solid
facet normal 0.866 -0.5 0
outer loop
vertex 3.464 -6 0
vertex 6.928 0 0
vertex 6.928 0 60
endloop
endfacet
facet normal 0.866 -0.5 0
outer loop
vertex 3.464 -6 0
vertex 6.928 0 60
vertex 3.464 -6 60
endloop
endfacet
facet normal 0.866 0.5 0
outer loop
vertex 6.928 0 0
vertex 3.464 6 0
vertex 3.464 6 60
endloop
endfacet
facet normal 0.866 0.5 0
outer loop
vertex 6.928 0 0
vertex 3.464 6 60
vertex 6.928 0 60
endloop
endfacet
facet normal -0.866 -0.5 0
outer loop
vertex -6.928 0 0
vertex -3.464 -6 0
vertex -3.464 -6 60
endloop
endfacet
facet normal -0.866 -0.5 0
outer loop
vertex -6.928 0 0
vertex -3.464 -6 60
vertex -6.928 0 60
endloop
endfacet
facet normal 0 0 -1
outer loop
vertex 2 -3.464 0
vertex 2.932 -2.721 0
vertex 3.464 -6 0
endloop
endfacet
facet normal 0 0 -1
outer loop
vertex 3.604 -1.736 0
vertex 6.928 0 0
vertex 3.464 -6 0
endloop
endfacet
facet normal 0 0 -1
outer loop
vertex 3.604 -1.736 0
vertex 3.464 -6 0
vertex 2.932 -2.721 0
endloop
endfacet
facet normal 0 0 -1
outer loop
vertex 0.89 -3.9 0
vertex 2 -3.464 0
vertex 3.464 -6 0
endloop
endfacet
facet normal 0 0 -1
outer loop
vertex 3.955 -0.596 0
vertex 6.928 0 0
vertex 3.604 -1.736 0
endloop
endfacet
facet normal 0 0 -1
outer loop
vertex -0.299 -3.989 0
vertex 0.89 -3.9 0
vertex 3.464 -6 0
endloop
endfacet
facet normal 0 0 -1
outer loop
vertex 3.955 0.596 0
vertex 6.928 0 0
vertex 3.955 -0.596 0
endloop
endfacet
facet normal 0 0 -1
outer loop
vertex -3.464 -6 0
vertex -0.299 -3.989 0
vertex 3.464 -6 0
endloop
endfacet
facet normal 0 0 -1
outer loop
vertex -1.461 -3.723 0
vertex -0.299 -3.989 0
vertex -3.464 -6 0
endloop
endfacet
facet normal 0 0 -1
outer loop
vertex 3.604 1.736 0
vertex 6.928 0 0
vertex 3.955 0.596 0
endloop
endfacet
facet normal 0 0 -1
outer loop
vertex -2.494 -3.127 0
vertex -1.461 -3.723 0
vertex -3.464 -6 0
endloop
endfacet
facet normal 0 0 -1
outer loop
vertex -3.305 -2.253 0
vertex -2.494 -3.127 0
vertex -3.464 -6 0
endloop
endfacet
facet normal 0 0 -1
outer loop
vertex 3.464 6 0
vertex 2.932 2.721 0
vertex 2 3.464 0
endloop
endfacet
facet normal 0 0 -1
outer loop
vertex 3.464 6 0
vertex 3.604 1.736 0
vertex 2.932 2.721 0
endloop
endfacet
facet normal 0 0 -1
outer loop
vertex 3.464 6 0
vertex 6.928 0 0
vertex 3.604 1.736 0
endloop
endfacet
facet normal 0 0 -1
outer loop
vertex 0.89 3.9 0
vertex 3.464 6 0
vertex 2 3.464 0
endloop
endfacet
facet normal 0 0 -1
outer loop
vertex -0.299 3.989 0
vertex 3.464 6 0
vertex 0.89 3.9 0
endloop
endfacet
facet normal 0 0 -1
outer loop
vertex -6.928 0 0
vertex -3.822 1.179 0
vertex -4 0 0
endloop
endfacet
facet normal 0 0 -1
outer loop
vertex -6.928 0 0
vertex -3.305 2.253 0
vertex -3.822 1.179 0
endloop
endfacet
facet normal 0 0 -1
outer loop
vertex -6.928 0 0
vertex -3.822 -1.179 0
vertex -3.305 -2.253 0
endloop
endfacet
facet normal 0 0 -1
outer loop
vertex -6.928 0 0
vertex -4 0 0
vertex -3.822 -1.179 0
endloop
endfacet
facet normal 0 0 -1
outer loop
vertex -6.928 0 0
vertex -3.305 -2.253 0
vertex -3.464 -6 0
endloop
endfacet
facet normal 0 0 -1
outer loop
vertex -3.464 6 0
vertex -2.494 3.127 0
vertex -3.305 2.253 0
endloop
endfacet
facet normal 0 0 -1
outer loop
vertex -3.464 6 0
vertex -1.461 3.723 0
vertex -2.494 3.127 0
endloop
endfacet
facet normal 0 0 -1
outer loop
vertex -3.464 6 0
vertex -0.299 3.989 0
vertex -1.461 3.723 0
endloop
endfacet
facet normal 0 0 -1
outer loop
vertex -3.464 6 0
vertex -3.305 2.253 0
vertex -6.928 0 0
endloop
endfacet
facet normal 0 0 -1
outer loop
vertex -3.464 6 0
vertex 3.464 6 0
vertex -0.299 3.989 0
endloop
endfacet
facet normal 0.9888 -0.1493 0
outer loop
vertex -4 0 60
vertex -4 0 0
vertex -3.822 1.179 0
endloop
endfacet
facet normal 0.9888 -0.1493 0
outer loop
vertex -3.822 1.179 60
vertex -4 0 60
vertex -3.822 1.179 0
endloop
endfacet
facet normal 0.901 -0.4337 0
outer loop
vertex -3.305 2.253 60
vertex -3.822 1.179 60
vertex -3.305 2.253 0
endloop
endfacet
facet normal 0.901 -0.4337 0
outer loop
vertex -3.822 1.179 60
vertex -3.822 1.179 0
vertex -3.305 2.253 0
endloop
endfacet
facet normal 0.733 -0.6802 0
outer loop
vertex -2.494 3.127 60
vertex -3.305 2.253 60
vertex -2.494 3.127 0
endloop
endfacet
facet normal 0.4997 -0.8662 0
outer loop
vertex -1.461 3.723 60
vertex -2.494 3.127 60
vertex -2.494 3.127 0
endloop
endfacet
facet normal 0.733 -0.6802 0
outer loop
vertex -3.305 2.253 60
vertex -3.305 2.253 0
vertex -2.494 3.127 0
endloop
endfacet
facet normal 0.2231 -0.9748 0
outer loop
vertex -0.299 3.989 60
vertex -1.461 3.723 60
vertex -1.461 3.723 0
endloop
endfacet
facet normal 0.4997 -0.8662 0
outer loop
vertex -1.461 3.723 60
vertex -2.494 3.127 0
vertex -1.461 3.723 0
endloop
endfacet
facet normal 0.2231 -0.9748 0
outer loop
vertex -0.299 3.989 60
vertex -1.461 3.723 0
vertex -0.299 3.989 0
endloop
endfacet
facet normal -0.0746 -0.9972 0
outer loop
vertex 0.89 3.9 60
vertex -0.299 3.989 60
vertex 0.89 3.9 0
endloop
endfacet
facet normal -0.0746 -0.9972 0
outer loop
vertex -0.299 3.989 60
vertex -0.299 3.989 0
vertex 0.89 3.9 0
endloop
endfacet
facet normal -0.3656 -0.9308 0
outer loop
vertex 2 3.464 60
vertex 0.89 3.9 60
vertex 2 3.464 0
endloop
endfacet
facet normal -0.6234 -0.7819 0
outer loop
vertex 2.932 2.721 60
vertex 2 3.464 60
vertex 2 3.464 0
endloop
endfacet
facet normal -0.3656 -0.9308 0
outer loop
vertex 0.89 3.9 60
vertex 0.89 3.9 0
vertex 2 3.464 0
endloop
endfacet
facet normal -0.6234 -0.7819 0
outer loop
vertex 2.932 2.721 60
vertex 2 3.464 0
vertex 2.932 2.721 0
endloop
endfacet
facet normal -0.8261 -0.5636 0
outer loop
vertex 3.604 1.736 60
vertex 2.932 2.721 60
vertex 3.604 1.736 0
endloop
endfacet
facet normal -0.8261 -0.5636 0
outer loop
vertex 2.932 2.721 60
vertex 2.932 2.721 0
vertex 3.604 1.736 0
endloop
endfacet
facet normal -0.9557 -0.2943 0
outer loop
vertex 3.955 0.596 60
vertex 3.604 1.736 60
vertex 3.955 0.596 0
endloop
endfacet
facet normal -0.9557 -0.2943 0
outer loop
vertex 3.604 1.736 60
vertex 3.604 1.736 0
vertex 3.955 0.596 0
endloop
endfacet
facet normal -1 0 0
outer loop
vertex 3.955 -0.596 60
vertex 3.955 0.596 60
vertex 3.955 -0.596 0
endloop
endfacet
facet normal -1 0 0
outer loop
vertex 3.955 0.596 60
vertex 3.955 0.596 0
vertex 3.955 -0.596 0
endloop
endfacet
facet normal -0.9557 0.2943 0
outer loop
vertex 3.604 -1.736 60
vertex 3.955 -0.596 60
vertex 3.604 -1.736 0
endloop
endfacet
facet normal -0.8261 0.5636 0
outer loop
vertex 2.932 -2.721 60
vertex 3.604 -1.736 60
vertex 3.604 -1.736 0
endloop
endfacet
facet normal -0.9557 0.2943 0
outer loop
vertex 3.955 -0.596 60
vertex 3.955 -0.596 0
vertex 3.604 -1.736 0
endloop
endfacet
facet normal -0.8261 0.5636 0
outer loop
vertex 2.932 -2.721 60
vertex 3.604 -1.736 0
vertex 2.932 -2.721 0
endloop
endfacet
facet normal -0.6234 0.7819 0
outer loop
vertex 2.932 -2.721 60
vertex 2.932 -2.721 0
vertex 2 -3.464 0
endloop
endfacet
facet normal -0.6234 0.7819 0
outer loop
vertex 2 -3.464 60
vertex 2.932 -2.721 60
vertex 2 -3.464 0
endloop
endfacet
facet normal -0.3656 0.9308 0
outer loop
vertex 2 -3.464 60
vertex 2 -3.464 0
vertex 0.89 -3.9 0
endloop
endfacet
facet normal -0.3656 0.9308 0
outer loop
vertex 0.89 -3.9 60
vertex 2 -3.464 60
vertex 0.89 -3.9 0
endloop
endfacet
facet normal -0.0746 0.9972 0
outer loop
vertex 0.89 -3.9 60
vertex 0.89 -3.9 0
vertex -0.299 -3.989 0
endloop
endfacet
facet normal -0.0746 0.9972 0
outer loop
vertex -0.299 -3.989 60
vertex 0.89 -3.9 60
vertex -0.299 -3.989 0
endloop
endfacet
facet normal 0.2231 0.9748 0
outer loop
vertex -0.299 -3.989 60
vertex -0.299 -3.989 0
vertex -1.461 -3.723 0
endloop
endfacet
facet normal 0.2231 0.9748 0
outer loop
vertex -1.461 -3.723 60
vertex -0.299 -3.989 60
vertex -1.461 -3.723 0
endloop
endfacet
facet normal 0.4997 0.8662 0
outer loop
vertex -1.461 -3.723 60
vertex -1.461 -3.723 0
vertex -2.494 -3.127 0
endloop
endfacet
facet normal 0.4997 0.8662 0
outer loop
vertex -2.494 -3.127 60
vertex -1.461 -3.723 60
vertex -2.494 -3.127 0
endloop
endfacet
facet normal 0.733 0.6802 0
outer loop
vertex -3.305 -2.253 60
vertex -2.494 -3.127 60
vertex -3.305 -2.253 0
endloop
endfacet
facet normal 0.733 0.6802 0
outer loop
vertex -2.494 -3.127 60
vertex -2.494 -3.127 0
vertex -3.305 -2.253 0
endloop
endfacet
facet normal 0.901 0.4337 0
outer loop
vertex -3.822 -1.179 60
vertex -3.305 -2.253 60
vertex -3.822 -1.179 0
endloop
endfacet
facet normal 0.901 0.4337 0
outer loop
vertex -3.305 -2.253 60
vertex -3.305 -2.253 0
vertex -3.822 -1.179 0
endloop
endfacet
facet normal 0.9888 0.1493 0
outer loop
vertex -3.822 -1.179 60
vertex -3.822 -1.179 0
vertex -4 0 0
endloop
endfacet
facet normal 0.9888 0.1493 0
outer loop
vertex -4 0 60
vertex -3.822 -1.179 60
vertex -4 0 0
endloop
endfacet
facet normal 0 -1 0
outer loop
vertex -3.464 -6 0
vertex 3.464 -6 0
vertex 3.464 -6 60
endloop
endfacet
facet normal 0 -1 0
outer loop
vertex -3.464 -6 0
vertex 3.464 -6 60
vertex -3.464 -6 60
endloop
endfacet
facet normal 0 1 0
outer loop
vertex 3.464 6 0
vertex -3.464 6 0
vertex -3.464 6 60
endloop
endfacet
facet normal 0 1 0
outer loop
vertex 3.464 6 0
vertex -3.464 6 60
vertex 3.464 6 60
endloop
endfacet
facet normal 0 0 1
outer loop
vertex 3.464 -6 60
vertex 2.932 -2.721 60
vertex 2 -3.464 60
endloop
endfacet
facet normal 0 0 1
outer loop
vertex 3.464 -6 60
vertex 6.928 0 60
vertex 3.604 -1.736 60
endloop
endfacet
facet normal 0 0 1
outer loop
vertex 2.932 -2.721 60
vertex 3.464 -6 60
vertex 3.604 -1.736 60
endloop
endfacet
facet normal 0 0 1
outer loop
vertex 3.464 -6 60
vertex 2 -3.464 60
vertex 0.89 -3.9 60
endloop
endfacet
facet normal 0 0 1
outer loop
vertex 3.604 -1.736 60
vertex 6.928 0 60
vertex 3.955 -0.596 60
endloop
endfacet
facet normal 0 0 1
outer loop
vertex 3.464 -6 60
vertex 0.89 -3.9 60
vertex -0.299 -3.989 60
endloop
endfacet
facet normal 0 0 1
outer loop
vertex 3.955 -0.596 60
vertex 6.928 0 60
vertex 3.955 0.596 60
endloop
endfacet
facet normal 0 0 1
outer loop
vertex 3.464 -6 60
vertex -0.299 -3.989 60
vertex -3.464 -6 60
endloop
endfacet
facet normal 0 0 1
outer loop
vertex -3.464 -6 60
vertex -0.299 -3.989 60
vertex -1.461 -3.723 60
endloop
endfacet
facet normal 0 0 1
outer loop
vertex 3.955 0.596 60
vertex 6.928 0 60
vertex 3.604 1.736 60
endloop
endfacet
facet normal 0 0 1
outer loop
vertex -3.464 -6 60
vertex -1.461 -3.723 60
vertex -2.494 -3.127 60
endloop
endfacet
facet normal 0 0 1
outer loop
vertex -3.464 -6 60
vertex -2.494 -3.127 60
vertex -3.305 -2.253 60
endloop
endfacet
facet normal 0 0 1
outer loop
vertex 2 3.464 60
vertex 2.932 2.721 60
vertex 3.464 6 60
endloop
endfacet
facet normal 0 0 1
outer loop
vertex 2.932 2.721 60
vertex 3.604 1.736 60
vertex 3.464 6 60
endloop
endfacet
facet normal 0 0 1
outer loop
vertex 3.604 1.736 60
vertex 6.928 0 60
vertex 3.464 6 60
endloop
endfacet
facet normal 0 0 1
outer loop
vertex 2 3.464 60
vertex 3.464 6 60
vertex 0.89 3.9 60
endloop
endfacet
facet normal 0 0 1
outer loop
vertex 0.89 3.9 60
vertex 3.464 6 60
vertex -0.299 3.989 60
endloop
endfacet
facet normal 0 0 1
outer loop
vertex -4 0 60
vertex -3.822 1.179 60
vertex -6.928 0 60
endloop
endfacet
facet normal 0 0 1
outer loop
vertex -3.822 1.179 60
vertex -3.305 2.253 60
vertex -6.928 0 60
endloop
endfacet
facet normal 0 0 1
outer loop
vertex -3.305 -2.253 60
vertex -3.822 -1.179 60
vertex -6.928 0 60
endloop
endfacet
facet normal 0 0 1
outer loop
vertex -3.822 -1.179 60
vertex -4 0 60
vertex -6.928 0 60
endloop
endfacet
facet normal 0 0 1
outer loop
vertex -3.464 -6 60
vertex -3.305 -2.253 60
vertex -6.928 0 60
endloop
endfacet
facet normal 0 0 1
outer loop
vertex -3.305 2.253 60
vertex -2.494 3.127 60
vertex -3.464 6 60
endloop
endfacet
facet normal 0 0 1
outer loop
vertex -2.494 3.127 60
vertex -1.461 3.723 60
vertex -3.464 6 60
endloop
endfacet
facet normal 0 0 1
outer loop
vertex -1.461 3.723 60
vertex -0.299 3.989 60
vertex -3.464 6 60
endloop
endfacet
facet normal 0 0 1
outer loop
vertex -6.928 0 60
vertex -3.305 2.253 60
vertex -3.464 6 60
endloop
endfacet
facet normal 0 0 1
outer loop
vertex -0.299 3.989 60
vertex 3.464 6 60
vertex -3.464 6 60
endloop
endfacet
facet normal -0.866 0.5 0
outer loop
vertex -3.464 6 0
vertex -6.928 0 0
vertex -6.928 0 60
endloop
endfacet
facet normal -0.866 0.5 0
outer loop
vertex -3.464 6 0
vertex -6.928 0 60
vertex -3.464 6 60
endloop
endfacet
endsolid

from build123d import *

# Parameters (mm, degrees)
SKETCH_1_R      = 4
EXTRUDE_1_DEPTH = 60


with BuildPart() as part:
    # 草图1 → 凸台-拉伸1 (new body)
    with BuildSketch(Plane(origin=(0, 0, 0), x_dir=(-1, 0, 0), z_dir=(0, 0, -1))):
        Polygon((3.464101615, -6), (6.92820323, 0), (3.464101615, 6), (-3.464101615, 6), (-6.92820323, 0), (-3.464101615, -6), align=None)
        Circle(SKETCH_1_R, mode=Mode.SUBTRACT)
    extrude(amount=-EXTRUDE_1_DEPTH)


solid = part.part
